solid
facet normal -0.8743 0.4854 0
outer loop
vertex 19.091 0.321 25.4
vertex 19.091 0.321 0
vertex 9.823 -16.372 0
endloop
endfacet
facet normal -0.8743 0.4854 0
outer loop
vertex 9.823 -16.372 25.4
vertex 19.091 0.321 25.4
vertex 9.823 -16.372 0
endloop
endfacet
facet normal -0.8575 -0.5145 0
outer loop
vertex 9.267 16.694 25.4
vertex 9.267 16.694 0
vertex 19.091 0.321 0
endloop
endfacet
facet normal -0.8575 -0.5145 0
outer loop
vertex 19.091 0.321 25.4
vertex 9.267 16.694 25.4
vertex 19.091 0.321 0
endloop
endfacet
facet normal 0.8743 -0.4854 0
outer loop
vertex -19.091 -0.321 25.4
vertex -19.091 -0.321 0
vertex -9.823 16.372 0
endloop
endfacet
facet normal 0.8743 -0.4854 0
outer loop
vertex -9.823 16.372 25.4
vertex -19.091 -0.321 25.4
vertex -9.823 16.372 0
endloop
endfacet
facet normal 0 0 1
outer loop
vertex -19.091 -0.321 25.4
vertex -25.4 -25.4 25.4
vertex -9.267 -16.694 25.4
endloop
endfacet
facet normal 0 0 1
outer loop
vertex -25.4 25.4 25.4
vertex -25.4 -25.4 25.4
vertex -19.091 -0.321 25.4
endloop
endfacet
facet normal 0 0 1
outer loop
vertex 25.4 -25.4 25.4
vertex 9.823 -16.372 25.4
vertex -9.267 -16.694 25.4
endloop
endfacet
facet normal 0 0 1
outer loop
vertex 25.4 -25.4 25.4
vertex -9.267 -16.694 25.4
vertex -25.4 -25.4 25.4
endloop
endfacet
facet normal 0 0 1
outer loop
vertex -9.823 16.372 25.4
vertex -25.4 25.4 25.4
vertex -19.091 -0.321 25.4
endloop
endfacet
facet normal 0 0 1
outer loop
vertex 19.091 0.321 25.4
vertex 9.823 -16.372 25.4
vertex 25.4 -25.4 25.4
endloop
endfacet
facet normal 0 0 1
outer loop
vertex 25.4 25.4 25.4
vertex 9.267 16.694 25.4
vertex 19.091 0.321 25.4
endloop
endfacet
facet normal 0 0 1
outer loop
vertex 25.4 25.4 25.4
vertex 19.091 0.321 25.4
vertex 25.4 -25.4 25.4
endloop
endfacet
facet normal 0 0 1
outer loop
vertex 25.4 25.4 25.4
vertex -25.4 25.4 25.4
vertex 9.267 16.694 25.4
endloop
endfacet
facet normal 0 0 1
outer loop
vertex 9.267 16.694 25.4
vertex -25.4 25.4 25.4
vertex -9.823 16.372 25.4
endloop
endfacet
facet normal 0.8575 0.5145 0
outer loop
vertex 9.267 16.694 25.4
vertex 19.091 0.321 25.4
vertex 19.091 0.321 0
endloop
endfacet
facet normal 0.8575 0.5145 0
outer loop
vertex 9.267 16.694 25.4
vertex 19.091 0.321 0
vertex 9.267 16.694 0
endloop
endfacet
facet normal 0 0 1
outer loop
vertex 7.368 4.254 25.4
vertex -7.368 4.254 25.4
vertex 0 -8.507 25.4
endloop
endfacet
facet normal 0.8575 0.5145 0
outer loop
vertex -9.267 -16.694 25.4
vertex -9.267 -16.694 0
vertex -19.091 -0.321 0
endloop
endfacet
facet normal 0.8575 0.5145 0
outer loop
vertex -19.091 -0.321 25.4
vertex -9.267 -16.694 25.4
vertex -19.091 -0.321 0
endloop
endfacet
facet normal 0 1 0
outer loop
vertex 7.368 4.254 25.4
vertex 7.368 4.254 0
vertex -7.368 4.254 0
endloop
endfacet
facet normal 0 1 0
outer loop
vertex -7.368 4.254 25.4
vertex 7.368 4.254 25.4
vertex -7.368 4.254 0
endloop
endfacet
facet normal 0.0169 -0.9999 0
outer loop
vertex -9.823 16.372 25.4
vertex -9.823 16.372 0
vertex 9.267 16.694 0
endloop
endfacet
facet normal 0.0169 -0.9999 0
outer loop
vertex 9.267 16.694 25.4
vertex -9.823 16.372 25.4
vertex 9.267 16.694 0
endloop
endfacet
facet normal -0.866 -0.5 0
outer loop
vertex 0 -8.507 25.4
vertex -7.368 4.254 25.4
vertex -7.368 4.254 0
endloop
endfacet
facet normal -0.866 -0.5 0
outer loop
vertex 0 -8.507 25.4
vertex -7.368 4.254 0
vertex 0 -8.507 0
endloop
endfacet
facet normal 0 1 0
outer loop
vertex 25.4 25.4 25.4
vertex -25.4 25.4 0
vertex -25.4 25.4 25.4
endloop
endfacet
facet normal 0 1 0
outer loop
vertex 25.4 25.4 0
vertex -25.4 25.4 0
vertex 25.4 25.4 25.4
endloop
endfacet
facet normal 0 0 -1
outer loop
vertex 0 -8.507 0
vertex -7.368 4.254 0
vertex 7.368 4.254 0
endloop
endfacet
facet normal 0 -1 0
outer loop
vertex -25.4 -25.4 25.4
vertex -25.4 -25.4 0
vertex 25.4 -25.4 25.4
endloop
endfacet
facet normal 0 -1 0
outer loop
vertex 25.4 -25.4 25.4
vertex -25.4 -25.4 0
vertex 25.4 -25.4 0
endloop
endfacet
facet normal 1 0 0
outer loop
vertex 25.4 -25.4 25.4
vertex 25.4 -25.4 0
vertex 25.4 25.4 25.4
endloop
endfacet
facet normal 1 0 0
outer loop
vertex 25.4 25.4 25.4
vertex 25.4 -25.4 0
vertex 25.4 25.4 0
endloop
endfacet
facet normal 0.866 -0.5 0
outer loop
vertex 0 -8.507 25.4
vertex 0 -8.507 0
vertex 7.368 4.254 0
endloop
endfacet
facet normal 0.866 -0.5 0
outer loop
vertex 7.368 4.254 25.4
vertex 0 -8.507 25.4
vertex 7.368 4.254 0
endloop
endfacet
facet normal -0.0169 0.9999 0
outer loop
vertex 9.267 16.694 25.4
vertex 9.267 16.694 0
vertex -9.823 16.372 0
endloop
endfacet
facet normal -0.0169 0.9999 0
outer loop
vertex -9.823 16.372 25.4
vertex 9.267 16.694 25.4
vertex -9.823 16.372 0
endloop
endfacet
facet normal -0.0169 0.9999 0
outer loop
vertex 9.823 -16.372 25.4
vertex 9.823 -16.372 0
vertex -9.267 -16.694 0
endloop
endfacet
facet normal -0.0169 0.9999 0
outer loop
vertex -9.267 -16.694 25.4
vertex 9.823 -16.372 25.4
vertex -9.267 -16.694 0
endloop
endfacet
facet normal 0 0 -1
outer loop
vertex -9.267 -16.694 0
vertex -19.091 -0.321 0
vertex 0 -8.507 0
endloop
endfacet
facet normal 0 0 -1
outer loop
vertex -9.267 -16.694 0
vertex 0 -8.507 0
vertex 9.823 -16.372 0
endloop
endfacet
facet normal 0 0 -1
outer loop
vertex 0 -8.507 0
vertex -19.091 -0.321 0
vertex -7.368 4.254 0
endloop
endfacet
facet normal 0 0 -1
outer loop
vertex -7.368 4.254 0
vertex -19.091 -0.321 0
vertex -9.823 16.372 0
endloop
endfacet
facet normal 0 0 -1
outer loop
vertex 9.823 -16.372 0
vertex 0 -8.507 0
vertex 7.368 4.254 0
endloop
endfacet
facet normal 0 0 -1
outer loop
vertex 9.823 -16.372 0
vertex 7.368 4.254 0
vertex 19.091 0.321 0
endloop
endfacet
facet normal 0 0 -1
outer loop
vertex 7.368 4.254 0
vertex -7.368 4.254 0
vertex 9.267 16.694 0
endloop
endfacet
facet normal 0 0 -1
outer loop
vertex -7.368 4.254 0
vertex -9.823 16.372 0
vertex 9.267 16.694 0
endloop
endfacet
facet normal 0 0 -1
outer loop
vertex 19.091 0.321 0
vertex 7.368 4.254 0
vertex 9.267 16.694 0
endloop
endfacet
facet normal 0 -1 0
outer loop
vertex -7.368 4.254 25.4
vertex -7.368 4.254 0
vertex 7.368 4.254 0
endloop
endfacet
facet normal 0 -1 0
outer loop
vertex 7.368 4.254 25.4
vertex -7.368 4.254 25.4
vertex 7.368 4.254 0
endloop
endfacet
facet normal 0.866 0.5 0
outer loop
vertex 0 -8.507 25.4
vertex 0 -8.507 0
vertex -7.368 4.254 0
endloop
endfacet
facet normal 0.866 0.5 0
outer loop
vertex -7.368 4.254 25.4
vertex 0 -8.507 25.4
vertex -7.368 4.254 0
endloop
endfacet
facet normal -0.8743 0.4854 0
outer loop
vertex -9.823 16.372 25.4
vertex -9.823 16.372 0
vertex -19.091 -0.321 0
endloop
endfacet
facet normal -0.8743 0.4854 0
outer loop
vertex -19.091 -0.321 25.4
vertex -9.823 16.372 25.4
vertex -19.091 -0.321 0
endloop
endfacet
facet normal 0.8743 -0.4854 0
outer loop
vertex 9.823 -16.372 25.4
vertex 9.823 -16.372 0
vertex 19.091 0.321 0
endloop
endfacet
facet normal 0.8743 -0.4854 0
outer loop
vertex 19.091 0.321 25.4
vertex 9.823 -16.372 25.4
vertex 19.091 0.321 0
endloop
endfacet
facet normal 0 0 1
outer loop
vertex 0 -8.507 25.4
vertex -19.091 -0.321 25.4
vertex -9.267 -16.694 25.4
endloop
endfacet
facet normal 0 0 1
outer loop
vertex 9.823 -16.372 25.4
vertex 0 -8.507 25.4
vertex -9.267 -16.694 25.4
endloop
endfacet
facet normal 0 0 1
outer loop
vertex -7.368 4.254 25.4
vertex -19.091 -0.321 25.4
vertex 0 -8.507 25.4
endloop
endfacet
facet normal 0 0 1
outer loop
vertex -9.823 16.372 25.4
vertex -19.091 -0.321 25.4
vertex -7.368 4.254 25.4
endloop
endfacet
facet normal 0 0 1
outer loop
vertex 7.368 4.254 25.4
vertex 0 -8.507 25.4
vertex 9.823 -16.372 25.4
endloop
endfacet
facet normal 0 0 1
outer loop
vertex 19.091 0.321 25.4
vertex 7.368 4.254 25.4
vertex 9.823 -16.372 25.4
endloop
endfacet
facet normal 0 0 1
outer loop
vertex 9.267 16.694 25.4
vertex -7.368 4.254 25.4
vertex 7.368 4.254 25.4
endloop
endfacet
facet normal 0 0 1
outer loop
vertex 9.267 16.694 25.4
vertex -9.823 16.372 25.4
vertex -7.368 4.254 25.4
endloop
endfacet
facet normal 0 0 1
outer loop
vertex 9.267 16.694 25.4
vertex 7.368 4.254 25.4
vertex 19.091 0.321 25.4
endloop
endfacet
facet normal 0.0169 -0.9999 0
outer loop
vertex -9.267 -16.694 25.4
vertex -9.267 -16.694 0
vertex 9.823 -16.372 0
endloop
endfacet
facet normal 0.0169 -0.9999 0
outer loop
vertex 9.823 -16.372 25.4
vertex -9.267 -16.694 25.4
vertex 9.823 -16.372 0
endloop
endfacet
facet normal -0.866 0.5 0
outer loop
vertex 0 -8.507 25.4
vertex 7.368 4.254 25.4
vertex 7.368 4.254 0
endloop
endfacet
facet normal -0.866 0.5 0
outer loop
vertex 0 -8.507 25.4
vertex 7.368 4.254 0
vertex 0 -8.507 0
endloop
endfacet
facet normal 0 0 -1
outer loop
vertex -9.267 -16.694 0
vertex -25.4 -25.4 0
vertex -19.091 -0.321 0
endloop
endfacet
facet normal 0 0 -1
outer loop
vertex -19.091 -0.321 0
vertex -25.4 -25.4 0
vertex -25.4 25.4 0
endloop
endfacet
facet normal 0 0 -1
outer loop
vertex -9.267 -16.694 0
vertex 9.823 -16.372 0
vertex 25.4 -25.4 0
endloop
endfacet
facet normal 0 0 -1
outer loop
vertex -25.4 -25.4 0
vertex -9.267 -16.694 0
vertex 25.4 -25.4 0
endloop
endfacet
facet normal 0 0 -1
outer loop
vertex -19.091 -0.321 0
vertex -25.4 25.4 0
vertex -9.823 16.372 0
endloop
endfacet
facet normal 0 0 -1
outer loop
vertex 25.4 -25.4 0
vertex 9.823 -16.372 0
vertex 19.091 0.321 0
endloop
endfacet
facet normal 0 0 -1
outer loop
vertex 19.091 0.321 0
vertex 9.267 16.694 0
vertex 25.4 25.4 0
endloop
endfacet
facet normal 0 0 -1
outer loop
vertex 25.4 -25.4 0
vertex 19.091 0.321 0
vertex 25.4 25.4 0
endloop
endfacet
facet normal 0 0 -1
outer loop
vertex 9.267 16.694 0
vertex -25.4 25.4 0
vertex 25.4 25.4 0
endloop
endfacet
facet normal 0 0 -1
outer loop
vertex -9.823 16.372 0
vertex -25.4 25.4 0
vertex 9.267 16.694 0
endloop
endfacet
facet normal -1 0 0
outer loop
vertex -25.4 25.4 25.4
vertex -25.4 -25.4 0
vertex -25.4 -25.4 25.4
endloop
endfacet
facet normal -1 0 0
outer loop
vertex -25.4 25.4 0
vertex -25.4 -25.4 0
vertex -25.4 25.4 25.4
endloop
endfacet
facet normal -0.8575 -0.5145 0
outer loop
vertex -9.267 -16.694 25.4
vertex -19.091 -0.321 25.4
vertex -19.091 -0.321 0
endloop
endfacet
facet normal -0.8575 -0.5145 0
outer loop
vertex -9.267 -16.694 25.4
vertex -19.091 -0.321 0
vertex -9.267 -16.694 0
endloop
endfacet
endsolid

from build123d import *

# Parameters (mm, degrees)
F0_W     = 50.8
F0_H     = 50.8
F1_DEPTH = 25.4
F2_DEPTH = 25.4
F3_DEPTH = 25.4


with BuildPart() as f1:
    # F0 (on Top) → F1 (new body)
    with BuildSketch(Plane.XY):
        Rectangle(F0_W, F0_H)
        Polygon((-9.823491, 16.372484), (9.267241, 16.693634), (19.090732, 0.321151), (9.823491, -16.372484), (-9.267241, -16.693634), (-19.090732, -0.321151), align=None, mode=Mode.SUBTRACT)
    extrude(amount=F1_DEPTH)


with BuildPart() as f2:
    # F0 (on Top) → F2 (new body)
    with BuildSketch(Plane.XY):
        Polygon((19.090732, 0.321151), (9.267241, 16.693634), (-9.823491, 16.372484), (-19.090732, -0.321151), (-9.267241, -16.693634), (9.823491, -16.372484), align=None)
        Polygon((0, -8.507392), (-7.367618, 4.253696), (7.367618, 4.253696), align=None, mode=Mode.SUBTRACT)
    extrude(amount=F2_DEPTH)


with BuildPart() as f3:
    # F0 (on Top) → F3 (new body)
    with BuildSketch(Plane.XY):
        Polygon((7.367618, 4.253696), (-7.367618, 4.253696), (0, -8.507392), align=None)
    extrude(amount=F3_DEPTH)


solid = Compound([f1.part, f2.part, f3.part])
